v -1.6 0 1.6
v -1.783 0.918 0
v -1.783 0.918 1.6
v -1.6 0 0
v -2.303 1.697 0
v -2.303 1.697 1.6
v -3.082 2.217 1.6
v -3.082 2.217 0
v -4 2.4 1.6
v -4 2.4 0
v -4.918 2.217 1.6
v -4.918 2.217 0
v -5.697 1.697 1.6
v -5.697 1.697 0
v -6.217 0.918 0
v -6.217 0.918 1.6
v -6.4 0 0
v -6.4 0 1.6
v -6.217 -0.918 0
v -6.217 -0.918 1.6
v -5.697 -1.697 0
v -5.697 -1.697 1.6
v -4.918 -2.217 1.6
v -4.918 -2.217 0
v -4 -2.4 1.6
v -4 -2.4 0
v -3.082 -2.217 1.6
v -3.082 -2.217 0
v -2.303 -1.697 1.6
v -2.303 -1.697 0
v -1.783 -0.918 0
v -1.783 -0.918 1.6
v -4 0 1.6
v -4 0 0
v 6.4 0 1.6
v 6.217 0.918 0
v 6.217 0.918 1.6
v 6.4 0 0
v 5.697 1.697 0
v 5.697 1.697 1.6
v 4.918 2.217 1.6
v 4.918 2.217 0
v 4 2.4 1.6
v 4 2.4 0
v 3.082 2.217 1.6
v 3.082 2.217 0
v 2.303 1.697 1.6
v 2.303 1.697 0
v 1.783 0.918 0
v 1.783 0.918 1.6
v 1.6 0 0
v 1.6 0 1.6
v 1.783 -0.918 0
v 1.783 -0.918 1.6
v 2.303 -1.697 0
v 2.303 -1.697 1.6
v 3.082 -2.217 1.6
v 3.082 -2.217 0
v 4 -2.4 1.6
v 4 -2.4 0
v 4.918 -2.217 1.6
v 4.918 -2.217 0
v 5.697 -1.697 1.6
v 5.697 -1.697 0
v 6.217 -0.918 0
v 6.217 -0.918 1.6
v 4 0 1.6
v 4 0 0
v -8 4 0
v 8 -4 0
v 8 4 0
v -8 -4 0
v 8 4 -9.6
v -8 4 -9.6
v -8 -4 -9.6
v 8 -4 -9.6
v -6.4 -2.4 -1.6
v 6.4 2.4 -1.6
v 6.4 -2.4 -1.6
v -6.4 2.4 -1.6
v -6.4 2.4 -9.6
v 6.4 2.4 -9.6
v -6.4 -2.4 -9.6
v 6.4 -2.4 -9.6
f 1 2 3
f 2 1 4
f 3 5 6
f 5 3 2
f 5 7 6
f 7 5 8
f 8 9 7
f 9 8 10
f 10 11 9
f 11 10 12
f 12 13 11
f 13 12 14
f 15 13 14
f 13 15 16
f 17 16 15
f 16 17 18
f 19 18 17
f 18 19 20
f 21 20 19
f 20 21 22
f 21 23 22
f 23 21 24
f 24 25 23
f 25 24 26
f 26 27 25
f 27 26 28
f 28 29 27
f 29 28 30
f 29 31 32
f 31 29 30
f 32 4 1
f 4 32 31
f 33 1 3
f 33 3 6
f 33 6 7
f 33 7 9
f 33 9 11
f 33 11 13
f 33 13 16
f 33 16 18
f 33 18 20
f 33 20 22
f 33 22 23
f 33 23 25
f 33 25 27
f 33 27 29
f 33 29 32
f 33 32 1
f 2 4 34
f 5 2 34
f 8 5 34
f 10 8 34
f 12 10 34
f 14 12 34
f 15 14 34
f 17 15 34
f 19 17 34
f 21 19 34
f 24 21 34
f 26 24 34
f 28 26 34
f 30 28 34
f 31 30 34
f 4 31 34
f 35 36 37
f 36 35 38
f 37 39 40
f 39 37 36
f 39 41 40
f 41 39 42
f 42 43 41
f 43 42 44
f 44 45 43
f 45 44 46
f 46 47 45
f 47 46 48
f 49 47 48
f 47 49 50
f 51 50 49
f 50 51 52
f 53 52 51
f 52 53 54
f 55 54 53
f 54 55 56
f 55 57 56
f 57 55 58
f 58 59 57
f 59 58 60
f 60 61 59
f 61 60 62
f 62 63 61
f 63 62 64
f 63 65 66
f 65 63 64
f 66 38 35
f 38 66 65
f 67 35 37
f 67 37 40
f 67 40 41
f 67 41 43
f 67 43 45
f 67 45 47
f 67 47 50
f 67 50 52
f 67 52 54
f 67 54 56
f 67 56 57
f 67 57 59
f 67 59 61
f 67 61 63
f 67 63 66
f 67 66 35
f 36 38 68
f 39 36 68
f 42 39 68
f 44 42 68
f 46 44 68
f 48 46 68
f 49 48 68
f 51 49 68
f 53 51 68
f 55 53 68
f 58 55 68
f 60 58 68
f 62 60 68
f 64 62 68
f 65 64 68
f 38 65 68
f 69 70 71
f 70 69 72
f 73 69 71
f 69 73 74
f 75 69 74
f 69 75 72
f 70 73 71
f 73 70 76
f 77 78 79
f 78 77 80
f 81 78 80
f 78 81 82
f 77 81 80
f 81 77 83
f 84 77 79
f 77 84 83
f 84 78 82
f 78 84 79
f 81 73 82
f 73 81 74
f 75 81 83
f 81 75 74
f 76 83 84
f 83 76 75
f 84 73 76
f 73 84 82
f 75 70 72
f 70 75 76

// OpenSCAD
// file: ../p/4-4edge.scad
use <../lib.scad>
function ldraw_lib__4_4edge() = [
// 0 Circle 1.0
// 0 Name: 4-4edge.dat
// 0 Author: James Jessiman
// 0 !LDRAW_ORG Primitive UPDATE 2017-01
// 0 !LICENSE Licensed under CC BY 2.0 and CC BY 4.0 : see CAreadme.txt
// 
// 0 BFC CERTIFY CCW
  [0,"BFC","CERTIFY"],
  [0,"BFC","CCW"],
// 
// 0 !HISTORY 1998-12-15 [PTadmin] Official Update 1998-10
// 0 !HISTORY 2005-12-28 [PTadmin] Official Update 2005-01
// 0 !HISTORY 2007-06-24 [PTadmin] Header formatted for Contributor Agreement
// 0 !HISTORY 2008-07-01 [PTadmin] Official Update 2008-01
// 0 !HISTORY 2017-01-15 [Steffen] BFCed
// 0 !HISTORY 2017-12-30 [PTadmin] Official Update 2017-01
// 
// 
// 2 24 1 0 0 0.9239 0 0.3827
  [2,24,1,0,0,0.9239,0,0.3827],
// 2 24 0.9239 0 0.3827 0.7071 0 0.7071
  [2,24,0.9239,0,0.3827,0.7071,0,0.7071],
// 2 24 0.7071 0 0.7071 0.3827 0 0.9239
  [2,24,0.7071,0,0.7071,0.3827,0,0.9239],
// 2 24 0.3827 0 0.9239 0 0 1
  [2,24,0.3827,0,0.9239,0,0,1],
// 2 24 0 0 1 -0.3827 0 0.9239
  [2,24,0,0,1,-0.3827,0,0.9239],
// 2 24 -0.3827 0 0.9239 -0.7071 0 0.7071
  [2,24,-0.3827,0,0.9239,-0.7071,0,0.7071],
// 2 24 -0.7071 0 0.7071 -0.9239 0 0.3827
  [2,24,-0.7071,0,0.7071,-0.9239,0,0.3827],
// 2 24 -0.9239 0 0.3827 -1 0 -0
  [2,24,-0.9239,0,0.3827,-1,0,-0],
// 2 24 -1 0 -0 -0.9239 0 -0.3827
  [2,24,-1,0,-0,-0.9239,0,-0.3827],
// 2 24 -0.9239 0 -0.3827 -0.7071 0 -0.7071
  [2,24,-0.9239,0,-0.3827,-0.7071,0,-0.7071],
// 2 24 -0.7071 0 -0.7071 -0.3827 0 -0.9239
  [2,24,-0.7071,0,-0.7071,-0.3827,0,-0.9239],
// 2 24 -0.3827 0 -0.9239 0 0 -1
  [2,24,-0.3827,0,-0.9239,0,0,-1],
// 2 24 0 0 -1 0.3827 0 -0.9239
  [2,24,0,0,-1,0.3827,0,-0.9239],
// 2 24 0.3827 0 -0.9239 0.7071 0 -0.7071
  [2,24,0.3827,0,-0.9239,0.7071,0,-0.7071],
// 2 24 0.7071 0 -0.7071 0.9239 0 -0.3827
  [2,24,0.7071,0,-0.7071,0.9239,0,-0.3827],
// 2 24 0.9239 0 -0.3827 1 0 0
  [2,24,0.9239,0,-0.3827,1,0,0],
];
module ldraw_lib__4_4edge(step=0, col=false, unit=2/5, alt=false, line=0.2, solid=!$preview)
    makepoly(ldraw_lib__4_4edge(), step=step, col=col, unit=unit, alt=alt, line=line, solid=solid);
ldraw_lib__4_4edge(line=0.2);
// file: ../p/4-4disc.scad
use <../lib.scad>
function ldraw_lib__4_4disc() = [
// 0 Disc 1.0
// 0 Name: 4-4disc.dat
// 0 Author: James Jessiman
// 0 !LDRAW_ORG Primitive UPDATE 2002-02
// 0 !LICENSE Licensed under CC BY 2.0 and CC BY 4.0 : see CAreadme.txt
// 
// 0 BFC CERTIFY CCW
  [0,"BFC","CERTIFY"],
  [0,"BFC","CCW"],
// 
// 0 !HISTORY 1998-12-15 [PTadmin] Official Update 1998-10
// 0 !HISTORY 2002-03-23 [sbliss] Added BFC statement
// 0 !HISTORY 2002-04-25 [PTadmin] Official Update 2002-02
// 0 !HISTORY 2007-06-24 [PTadmin] Header formatted for Contributor Agreement
// 0 !HISTORY 2008-07-01 [PTadmin] Official Update 2008-01
// 
// 
// 3 16 0 0 0 1 0 0 0.9239 0 0.3827
  [3,16,0,0,0,1,0,0,0.9239,0,0.3827],
// 3 16 0 0 0 0.9239 0 0.3827 0.7071 0 0.7071
  [3,16,0,0,0,0.9239,0,0.3827,0.7071,0,0.7071],
// 3 16 0 0 0 0.7071 0 0.7071 0.3827 0 0.9239
  [3,16,0,0,0,0.7071,0,0.7071,0.3827,0,0.9239],
// 3 16 0 0 0 0.3827 0 0.9239 0 0 1
  [3,16,0,0,0,0.3827,0,0.9239,0,0,1],
// 3 16 0 0 0 0 0 1 -0.3827 0 0.9239
  [3,16,0,0,0,0,0,1,-0.3827,0,0.9239],
// 3 16 0 0 0 -0.3827 0 0.9239 -0.7071 0 0.7071
  [3,16,0,0,0,-0.3827,0,0.9239,-0.7071,0,0.7071],
// 3 16 0 0 0 -0.7071 0 0.7071 -0.9239 0 0.3827
  [3,16,0,0,0,-0.7071,0,0.7071,-0.9239,0,0.3827],
// 3 16 0 0 0 -0.9239 0 0.3827 -1 0 -0
  [3,16,0,0,0,-0.9239,0,0.3827,-1,0,-0],
// 3 16 0 0 0 -1 0 -0 -0.9239 0 -0.3827
  [3,16,0,0,0,-1,0,-0,-0.9239,0,-0.3827],
// 3 16 0 0 0 -0.9239 0 -0.3827 -0.7071 0 -0.7071
  [3,16,0,0,0,-0.9239,0,-0.3827,-0.7071,0,-0.7071],
// 3 16 0 0 0 -0.7071 0 -0.7071 -0.3827 0 -0.9239
  [3,16,0,0,0,-0.7071,0,-0.7071,-0.3827,0,-0.9239],
// 3 16 0 0 0 -0.3827 0 -0.9239 0 0 -1
  [3,16,0,0,0,-0.3827,0,-0.9239,0,0,-1],
// 3 16 0 0 0 0 0 -1 0.3827 0 -0.9239
  [3,16,0,0,0,0,0,-1,0.3827,0,-0.9239],
// 3 16 0 0 0 0.3827 0 -0.9239 0.7071 0 -0.7071
  [3,16,0,0,0,0.3827,0,-0.9239,0.7071,0,-0.7071],
// 3 16 0 0 0 0.7071 0 -0.7071 0.9239 0 -0.3827
  [3,16,0,0,0,0.7071,0,-0.7071,0.9239,0,-0.3827],
// 3 16 0 0 0 0.9239 0 -0.3827 1 0 0
  [3,16,0,0,0,0.9239,0,-0.3827,1,0,0],
// 0
];
module ldraw_lib__4_4disc(step=0, col=false, unit=2/5, alt=false, line=0.2, solid=!$preview)
    makepoly(ldraw_lib__4_4disc(), step=step, col=col, unit=unit, alt=alt, line=line, solid=solid);
ldraw_lib__4_4disc(line=0.2);
// file: ../p/4-4cyli.scad
use <../lib.scad>
$fa=1; $fs=0.2;
function ldraw_lib__4_4cyli(realsolid=false) = [
// 0 Cylinder 1.0
// 0 Name: 4-4cyli.dat
// 0 Author: James Jessiman
// 0 !LDRAW_ORG Primitive UPDATE 2005-01
// 0 !LICENSE Licensed under CC BY 2.0 and CC BY 4.0 : see CAreadme.txt
// 
// 0 BFC CERTIFY CCW
  [0,"BFC","CERTIFY"],
  [0,"BFC","CCW"],
// 
// 0 !HISTORY 1998-12-15 [PTadmin] Official Update 1998-10
// 0 !HISTORY 2002-03-23 [sbliss] Added BFC statement; merged headers from files in distributions LDraw 0.27 and Complete.
// 0 !HISTORY 2002-04-25 [PTadmin] Official Update 2002-02
// 0 !HISTORY 2004-12-14 [guyvivan] BFC CCW
// 0 !HISTORY 2005-12-28 [PTadmin] Official Update 2005-01
// 0 !HISTORY 2007-06-24 [PTadmin] Header formatted for Contributor Agreement
// 0 !HISTORY 2008-07-01 [PTadmin] Official Update 2008-01
// 
// 
// 4 16 1 1 0 0.9239 1 0.3827 0.9239 0 0.3827 1 0 0
  [4,16,1,1,0,0.9239,1,0.3827,0.9239,0,0.3827,1,0,0],
// 5 24 1 0 0 1 1 0 0.9239 0 0.3827 0.9239 0 -0.3827
  [5,24,1,0,0,1,1,0,0.9239,0,0.3827,0.9239,0,-0.3827],
// 4 16 0.9239 1 0.3827 0.7071 1 0.7071 0.7071 0 0.7071 0.9239 0 0.3827
  [4,16,0.9239,1,0.3827,0.7071,1,0.7071,0.7071,0,0.7071,0.9239,0,0.3827],
// 5 24 0.9239 0 0.3827 0.9239 1 0.3827 0.7071 0 0.7071 1 0 0
  [5,24,0.9239,0,0.3827,0.9239,1,0.3827,0.7071,0,0.7071,1,0,0],
// 4 16 0.7071 1 0.7071 0.3827 1 0.9239 0.3827 0 0.9239 0.7071 0 0.7071
  [4,16,0.7071,1,0.7071,0.3827,1,0.9239,0.3827,0,0.9239,0.7071,0,0.7071],
// 5 24 0.7071 0 0.7071 0.7071 1 0.7071 0.3827 0 0.9239 0.9239 0 0.3827
  [5,24,0.7071,0,0.7071,0.7071,1,0.7071,0.3827,0,0.9239,0.9239,0,0.3827],
// 4 16 0.3827 1 0.9239 0 1 1 0 0 1 0.3827 0 0.9239
  [4,16,0.3827,1,0.9239,0,1,1,0,0,1,0.3827,0,0.9239],
// 5 24 0.3827 0 0.9239 0.3827 1 0.9239 0 0 1 0.7071 0 0.7071
  [5,24,0.3827,0,0.9239,0.3827,1,0.9239,0,0,1,0.7071,0,0.7071],
// 4 16 0 1 1 -0.3827 1 0.9239 -0.3827 0 0.9239 0 0 1
  [4,16,0,1,1,-0.3827,1,0.9239,-0.3827,0,0.9239,0,0,1],
// 5 24 0 0 1 0 1 1 -0.3827 0 0.9239 0.3827 0 0.9239
  [5,24,0,0,1,0,1,1,-0.3827,0,0.9239,0.3827,0,0.9239],
// 4 16 -0.3827 1 0.9239 -0.7071 1 0.7071 -0.7071 0 0.7071 -0.3827 0 0.9239
  [4,16,-0.3827,1,0.9239,-0.7071,1,0.7071,-0.7071,0,0.7071,-0.3827,0,0.9239],
// 5 24 -0.3827 0 0.9239 -0.3827 1 0.9239 -0.7071 0 0.7071 0 0 1
  [5,24,-0.3827,0,0.9239,-0.3827,1,0.9239,-0.7071,0,0.7071,0,0,1],
// 4 16 -0.7071 1 0.7071 -0.9239 1 0.3827 -0.9239 0 0.3827 -0.7071 0 0.7071
  [4,16,-0.7071,1,0.7071,-0.9239,1,0.3827,-0.9239,0,0.3827,-0.7071,0,0.7071],
// 5 24 -0.7071 0 0.7071 -0.7071 1 0.7071 -0.9239 0 0.3827 -0.3827 0 0.9239
  [5,24,-0.7071,0,0.7071,-0.7071,1,0.7071,-0.9239,0,0.3827,-0.3827,0,0.9239],
// 4 16 -0.9239 1 0.3827 -1 1 0 -1 0 0 -0.9239 0 0.3827
  [4,16,-0.9239,1,0.3827,-1,1,0,-1,0,0,-0.9239,0,0.3827],
// 5 24 -0.9239 0 0.3827 -0.9239 1 0.3827 -1 0 0 -0.7071 0 0.7071
  [5,24,-0.9239,0,0.3827,-0.9239,1,0.3827,-1,0,0,-0.7071,0,0.7071],
// 4 16 -1 1 0 -0.9239 1 -0.3827 -0.9239 0 -0.3827 -1 0 0
  [4,16,-1,1,0,-0.9239,1,-0.3827,-0.9239,0,-0.3827,-1,0,0],
// 5 24 -1 0 0 -1 1 0 -0.9239 0 -0.3827 -0.9239 0 0.3827
  [5,24,-1,0,0,-1,1,0,-0.9239,0,-0.3827,-0.9239,0,0.3827],
// 4 16 -0.9239 1 -0.3827 -0.7071 1 -0.7071 -0.7071 0 -0.7071 -0.9239 0 -0.3827
  [4,16,-0.9239,1,-0.3827,-0.7071,1,-0.7071,-0.7071,0,-0.7071,-0.9239,0,-0.3827],
// 5 24 -0.9239 0 -0.3827 -0.9239 1 -0.3827 -0.7071 0 -0.7071 -1 0 0
  [5,24,-0.9239,0,-0.3827,-0.9239,1,-0.3827,-0.7071,0,-0.7071,-1,0,0],
// 4 16 -0.7071 1 -0.7071 -0.3827 1 -0.9239 -0.3827 0 -0.9239 -0.7071 0 -0.7071
  [4,16,-0.7071,1,-0.7071,-0.3827,1,-0.9239,-0.3827,0,-0.9239,-0.7071,0,-0.7071],
// 5 24 -0.7071 0 -0.7071 -0.7071 1 -0.7071 -0.3827 0 -0.9239 -0.9239 0 -0.3827
  [5,24,-0.7071,0,-0.7071,-0.7071,1,-0.7071,-0.3827,0,-0.9239,-0.9239,0,-0.3827],
// 4 16 -0.3827 1 -0.9239 0 1 -1 0 0 -1 -0.3827 0 -0.9239
  [4,16,-0.3827,1,-0.9239,0,1,-1,0,0,-1,-0.3827,0,-0.9239],
// 5 24 -0.3827 0 -0.9239 -0.3827 1 -0.9239 0 0 -1 -0.7071 0 -0.7071
  [5,24,-0.3827,0,-0.9239,-0.3827,1,-0.9239,0,0,-1,-0.7071,0,-0.7071],
// 4 16 0 1 -1 0.3827 1 -0.9239 0.3827 0 -0.9239 0 0 -1
  [4,16,0,1,-1,0.3827,1,-0.9239,0.3827,0,-0.9239,0,0,-1],
// 5 24 0 0 -1 0 1 -1 0.3827 0 -0.9239 -0.3827 0 -0.9239
  [5,24,0,0,-1,0,1,-1,0.3827,0,-0.9239,-0.3827,0,-0.9239],
// 4 16 0.3827 1 -0.9239 0.7071 1 -0.7071 0.7071 0 -0.7071 0.3827 0 -0.9239
  [4,16,0.3827,1,-0.9239,0.7071,1,-0.7071,0.7071,0,-0.7071,0.3827,0,-0.9239],
// 5 24 0.3827 0 -0.9239 0.3827 1 -0.9239 0.7071 0 -0.7071 0 0 -1
  [5,24,0.3827,0,-0.9239,0.3827,1,-0.9239,0.7071,0,-0.7071,0,0,-1],
// 4 16 0.7071 1 -0.7071 0.9239 1 -0.3827 0.9239 0 -0.3827 0.7071 0 -0.7071
  [4,16,0.7071,1,-0.7071,0.9239,1,-0.3827,0.9239,0,-0.3827,0.7071,0,-0.7071],
// 5 24 0.7071 0 -0.7071 0.7071 1 -0.7071 0.9239 0 -0.3827 0.3827 0 -0.9239
  [5,24,0.7071,0,-0.7071,0.7071,1,-0.7071,0.9239,0,-0.3827,0.3827,0,-0.9239],
// 4 16 0.9239 1 -0.3827 1 1 0 1 0 0 0.9239 0 -0.3827
  [4,16,0.9239,1,-0.3827,1,1,0,1,0,0,0.9239,0,-0.3827],
// 5 24 0.9239 0 -0.3827 0.9239 1 -0.3827 1 0 0 0.7071 0 -0.7071
  [5,24,0.9239,0,-0.3827,0.9239,1,-0.3827,1,0,0,0.7071,0,-0.7071],
// 0
];
module ldraw_lib__4_4cyli(step=0, col=false, unit=2/5, alt=false, line=0.2, solid=!$preview)
    makepoly(ldraw_lib__4_4cyli(solid), step=step, col=col, unit=unit, alt=alt, line=line, solid=solid);
ldraw_lib__4_4cyli(line=0.2);
// file: ../p/stud.scad
use <../lib.scad>
use <4-4cyli.scad>
use <4-4disc.scad>
use <4-4edge.scad>
function ldraw_lib__stud() = [
// 0 Stud
// 0 Name: stud.dat
// 0 Author: James Jessiman
// 0 !LDRAW_ORG Primitive UPDATE 2012-01
// 0 !LICENSE Licensed under CC BY 4.0 : see CAreadme.txt
// 
// 0 BFC CERTIFY CCW
  [0,"BFC","CERTIFY"],
  [0,"BFC","CCW"],
// 
// 0 !HISTORY 2002-04-04 [sbliss] Modified for BFC compliance
// 0 !HISTORY 2002-04-25 [PTadmin] Official Update 2002-02
// 0 !HISTORY 2007-06-24 [PTadmin] Header formatted for Contributor Agreement
// 0 !HISTORY 2008-07-01 [PTadmin] Official Update 2008-01
// 0 !HISTORY 2012-02-16 [Philo] Changed to CCW
// 0 !HISTORY 2012-03-30 [PTadmin] Official Update 2012-01
// 
// 
// 1 16 0 0 0 6 0 0 0 1 0 0 0 6 4-4edge.dat
  [1,16,0,0,0,6,0,0,0,1,0,0,0,6, ldraw_lib__4_4edge()],
// 1 16 0 -4 0 6 0 0 0 1 0 0 0 6 4-4edge.dat
  [1,16,0,-4,0,6,0,0,0,1,0,0,0,6, ldraw_lib__4_4edge()],
// 1 16 0 0 0 6 0 0 0 -4 0 0 0 6 4-4cyli.dat
  [1,16,0,0,0,6,0,0,0,-4,0,0,0,6, ldraw_lib__4_4cyli()],
// 1 16 0 -4 0 6 0 0 0 1 0 0 0 6 4-4disc.dat
  [1,16,0,-4,0,6,0,0,0,1,0,0,0,6, ldraw_lib__4_4disc()],
  [-1,16,0,0,0,6,0,0,0,-1,0,0,0,6, ldraw_lib__4_4disc()],
];
module ldraw_lib__stud(step=0, col=false, unit=2/5, alt=false, line=0.2, solid=!$preview)
    makepoly(ldraw_lib__stud(), step=step, col=col, unit=unit, alt=alt, line=line, solid=solid);
ldraw_lib__stud(line=0.2);
// file: ../p/stug-1x2.scad
use <../lib.scad>
use <stud.scad>
$fa=1; $fs=0.2;
function ldraw_lib__stug_1x2(realsolid=false) = [
// 0 Stud Group  1 x  2
// 0 Name: stug-1x2.dat
// 0 Author: Steffen [Steffen]
// 0 !LDRAW_ORG Primitive UPDATE 2011-01
// 0 !LICENSE Licensed under CC BY 2.0 and CC BY 4.0 : see CAreadme.txt
// 
// 0 BFC CERTIFY CCW
  [0,"BFC","CERTIFY"],
  [0,"BFC","CCW"],
// 
// 0 !HISTORY 2011-07-25 [PTadmin] Official Update 2011-01
// 
// 
// 1 16 -10 0 0 1 0 0 0 1 0 0 0 1 stud.dat
  [1,16,-10,0,0,1,0,0,0,1,0,0,0,1, ldraw_lib__stud(realsolid)],
// 1 16 10 0 0 1 0 0 0 1 0 0 0 1 stud.dat
  [1,16,10,0,0,1,0,0,0,1,0,0,0,1, ldraw_lib__stud(realsolid)],
];
module ldraw_lib__stug_1x2(step=0, col=false, unit=2/5, alt=false, line=0.2, solid=!$preview)
    makepoly(ldraw_lib__stug_1x2(solid), step=step, col=col, unit=unit, alt=alt, line=line, solid=solid);
ldraw_lib__stug_1x2(line=0.2);
// file: ../p/box5.scad
use <../lib.scad>
function ldraw_lib__box5() = [
// 0 Box with 5 Faces and All Edges
// 0 Name: box5.dat
// 0 Author: James Jessiman
// 0 !LDRAW_ORG Primitive UPDATE 2012-01
// 0 !LICENSE Licensed under CC BY 2.0 and CC BY 4.0 : see CAreadme.txt
// 
// 0 BFC CERTIFY CCW
  [0,"BFC","CERTIFY"],
  [0,"BFC","CCW"],
// 
// 0 !HISTORY 2002-04-03 [sbliss] Modified for BFC compliance
// 0 !HISTORY 2002-04-25 [PTadmin] Official Update 2002-02
// 0 !HISTORY 2007-06-24 [PTadmin] Header formatted for Contributor Agreement
// 0 !HISTORY 2008-07-01 [PTadmin] Official Update 2008-01
// 0 !HISTORY 2012-02-16 [Philo] Changed to CCW
// 0 !HISTORY 2012-03-30 [PTadmin] Official Update 2012-01
// 
// 
// 2 24 1 1 1 -1 1 1
  [2,24,1,1,1,-1,1,1],
// 2 24 -1 1 1 -1 1 -1
  [2,24,-1,1,1,-1,1,-1],
// 2 24 -1 1 -1 1 1 -1
  [2,24,-1,1,-1,1,1,-1],
// 2 24 1 1 -1 1 1 1
  [2,24,1,1,-1,1,1,1],
// 2 24 1 0 1 -1 0 1
  [2,24,1,0,1,-1,0,1],
// 2 24 -1 0 1 -1 0 -1
  [2,24,-1,0,1,-1,0,-1],
// 2 24 -1 0 -1 1 0 -1
  [2,24,-1,0,-1,1,0,-1],
// 2 24 1 0 -1 1 0 1
  [2,24,1,0,-1,1,0,1],
// 2 24 1 0 1 1 1 1
  [2,24,1,0,1,1,1,1],
// 2 24 -1 0 1 -1 1 1
  [2,24,-1,0,1,-1,1,1],
// 2 24 1 0 -1 1 1 -1
  [2,24,1,0,-1,1,1,-1],
// 2 24 -1 0 -1 -1 1 -1
  [2,24,-1,0,-1,-1,1,-1],
// 4 16 -1 1 1 1 1 1 1 1 -1 -1 1 -1
  [4,16,-1,1,1,1,1,1,1,1,-1,-1,1,-1],
// 4 16 -1 1 1 -1 0 1 1 0 1 1 1 1
  [4,16,-1,1,1,-1,0,1,1,0,1,1,1,1],
// 4 16 -1 1 -1 -1 0 -1 -1 0 1 -1 1 1
  [4,16,-1,1,-1,-1,0,-1,-1,0,1,-1,1,1],
// 4 16 1 1 -1 1 0 -1 -1 0 -1 -1 1 -1
  [4,16,1,1,-1,1,0,-1,-1,0,-1,-1,1,-1],
// 4 16 1 1 1 1 0 1 1 0 -1 1 1 -1
  [4,16,1,1,1,1,0,1,1,0,-1,1,1,-1],
];
makepoly(ldraw_lib__box5(), line=0.2);
// file: ../p/box4t.scad
use <../lib.scad>
function ldraw_lib__box4t() = [
// 0 Box with 4 Adjacent Faces and All Edges
// 0 Name: box4t.dat
// 0 Author: Tore Eriksson [Tore_Eriksson]
// 0 !LDRAW_ORG Primitive UPDATE 2003-02
// 0 !LICENSE Licensed under CC BY 2.0 and CC BY 4.0 : see CAreadme.txt
// 
// 0 BFC CERTIFY CCW
  [0,"BFC","CERTIFY"],
  [0,"BFC","CCW"],
// 
// 0 !HISTORY 1997-09-29 [PTadmin] Official Update 1997-15
// 0 !HISTORY 2002-08-31 [izanette] Modified with WINDZ for BFC compliance
// 0 !HISTORY 2003-08-01 [PTadmin] Official Update 2003-02
// 0 !HISTORY 2007-06-24 [PTadmin] Header formatted for Contributor Agreement
// 0 !HISTORY 2008-07-01 [PTadmin] Official Update 2008-01
// 
// 
// 2 24 1 1 1 -1 1 1
  [2,24,1,1,1,-1,1,1],
// 2 24 -1 1 1 -1 1 -1
  [2,24,-1,1,1,-1,1,-1],
// 2 24 -1 1 -1 1 1 -1
  [2,24,-1,1,-1,1,1,-1],
// 2 24 1 1 -1 1 1 1
  [2,24,1,1,-1,1,1,1],
// 2 24 1 0 1 -1 0 1
  [2,24,1,0,1,-1,0,1],
// 2 24 -1 0 1 -1 0 -1
  [2,24,-1,0,1,-1,0,-1],
// 2 24 -1 0 -1 1 0 -1
  [2,24,-1,0,-1,1,0,-1],
// 2 24 1 0 -1 1 0 1
  [2,24,1,0,-1,1,0,1],
// 2 24 1 0 1 1 1 1
  [2,24,1,0,1,1,1,1],
// 2 24 -1 0 1 -1 1 1
  [2,24,-1,0,1,-1,1,1],
// 2 24 1 0 -1 1 1 -1
  [2,24,1,0,-1,1,1,-1],
// 2 24 -1 0 -1 -1 1 -1
  [2,24,-1,0,-1,-1,1,-1],
// 4 16 1 1 1 1 1 -1 -1 1 -1 -1 1 1
  [4,16,1,1,1,1,1,-1,-1,1,-1,-1,1,1],
// 4 16 1 1 1 -1 1 1 -1 0 1 1 0 1
  [4,16,1,1,1,-1,1,1,-1,0,1,1,0,1],
// 4 16 -1 1 1 -1 1 -1 -1 0 -1 -1 0 1
  [4,16,-1,1,1,-1,1,-1,-1,0,-1,-1,0,1],
// 0 4 16 -1 1 -1 -1 0 -1 1 0 -1 1 1 -1
// 4 16 1 1 -1 1 1 1 1 0 1 1 0 -1
  [4,16,1,1,-1,1,1,1,1,0,1,1,0,-1],
// 0
];
makepoly(ldraw_lib__box4t(), line=0.2);
// file: s/3065s01.scad
use <../../lib.scad>
use <../../p/box4t.scad>
use <../../p/box5.scad>
use <../../p/stug-1x2.scad>
function ldraw_lib__s__3065s01() = [
// 0 ~Brick  1 x  2 without Centre Stud without Front
// 0 Name: s\3065s01.dat
// 0 Author: Rene Rechthaler [Blechtaler]
// 0 !LDRAW_ORG Subpart UPDATE 2025-06
// 0 !LICENSE Licensed under CC BY 4.0 : see CAreadme.txt
// 
// 0 BFC CERTIFY CCW
  [0,"BFC","CERTIFY"],
  [0,"BFC","CCW"],
// 
// 0 !HISTORY 2025-04-10 [Blechtaler] made from 3065 by James Jessiman
// 0 !HISTORY 2025-06-26 [OrionP] Official Update 2025-06
// 
// 1 16 0 0 0 1 0 0 0 1 0 0 0 1 stug-1x2.dat
  [1,16,0,0,0,1,0,0,0,1,0,0,0,1, ldraw_lib__stug_1x2()],
// 1 16 0 24 0 20 0 0 0 -24 0 0 0 10 box4t.dat
  [1,16,0,24,0,20,0,0,0,-24,0,0,0,10, ldraw_lib__box4t()],
// 0 BFC INVERTNEXT
  [0,"BFC","INVERTNEXT"],
// 1 16 0 24 0 16 0 0 0 -20 0 0 0 6 box5.dat
  [1,16,0,24,0,16,0,0,0,-20,0,0,0,6, ldraw_lib__box5()],
// 4 16 20 24 10 16 24 6 -16 24 6 -20 24 10
  [4,16,20,24,10,16,24,6,-16,24,6,-20,24,10],
// 4 16 -20 24 10 -16 24 6 -16 24 -6 -20 24 -10
  [4,16,-20,24,10,-16,24,6,-16,24,-6,-20,24,-10],
// 4 16 -20 24 -10 -16 24 -6 16 24 -6 20 24 -10
  [4,16,-20,24,-10,-16,24,-6,16,24,-6,20,24,-10],
// 4 16 20 24 -10 16 24 -6 16 24 6 20 24 10
  [4,16,20,24,-10,16,24,-6,16,24,6,20,24,10],
];
module ldraw_lib__s__3065s01(step=0, col=false, unit=2/5, alt=false, line=0.2, solid=!$preview)
    makepoly(ldraw_lib__s__3065s01(), step=step, col=col, unit=unit, alt=alt, line=line, solid=solid);
ldraw_lib__s__3065s01(line=0.2);
// file: 3065.scad
use <../lib.scad>
use <s/3065s01.scad>
function ldraw_lib__3065() = [
// 0 Brick  1 x  2 without Centre Stud
// 0 Name: 3065.dat
// 0 Author: James Jessiman
// 0 !LDRAW_ORG Part UPDATE 2025-06
// 0 !LICENSE Licensed under CC BY 4.0 : see CAreadme.txt
// 
// 0 BFC CERTIFY CCW
  [0,"BFC","CERTIFY"],
  [0,"BFC","CCW"],
// 
// 0 !HISTORY 2007-12-20 [PTadmin] Header formatted for Contributor Agreement
// 0 !HISTORY 2008-07-01 [PTadmin] Official Update 2008-01
// 0 !HISTORY 2012-03-11 [Steffen] BFCed
// 0 !HISTORY 2012-03-30 [PTadmin] Official Update 2012-01
// 0 !HISTORY 2025-04-10 [Blechtaler] subfiled everything but the front
// 0 !HISTORY 2025-06-26 [OrionP] Official Update 2025-06
// 
// 1 16 0 0 0 1 0 0 0 1 0 0 0 1 s\3065s01.dat
  [1,16,0,0,0,1,0,0,0,1,0,0,0,1, ldraw_lib__s__3065s01()],
// 4 16 20 0 -10 -20 0 -10 -20 24 -10 20 24 -10
  [4,16,20,0,-10,-20,0,-10,-20,24,-10,20,24,-10],
];
module ldraw_lib__3065(step=0, col=false, unit=2/5, alt=false, line=0.2, solid=!$preview)
    makepoly(ldraw_lib__3065(), step=step, col=col, unit=unit, alt=alt, line=line, solid=solid);
ldraw_lib__3065(line=0.2);
// main file
use <../lib.scad>
use <3065.scad>
function ldraw_lib__35743() = [
// 0 =Brick  1 x  2 without Centre Stud
// 0 Name: 35743.dat
// 0 Author: Massimo Maso [Sirio]
// 0 !LDRAW_ORG Part Alias UPDATE 2025-06
// 0 !LICENSE Licensed under CC BY 4.0 : see CAreadme.txt
// 
// 0 BFC CERTIFY CCW
  [0,"BFC","CERTIFY"],
  [0,"BFC","CCW"],
// 
// 0 !KEYWORDS BrickLink 3065, Rebrickable 3065
// 
// 0 !HISTORY 2025-06-26 [OrionP] Official Update 2025-06
// 
// 1 16 0 0 0 1 0 0 0 1 0 0 0 1 3065.dat
  [1,16,0,0,0,1,0,0,0,1,0,0,0,1, ldraw_lib__3065()],
];
module ldraw_lib__35743(step=0, col=false, unit=2/5, alt=false, line=0.2, solid=!$preview)
    makepoly(ldraw_lib__35743(), step=step, col=col, unit=unit, alt=alt, line=line, solid=solid);
ldraw_lib__35743(line=0.2);
